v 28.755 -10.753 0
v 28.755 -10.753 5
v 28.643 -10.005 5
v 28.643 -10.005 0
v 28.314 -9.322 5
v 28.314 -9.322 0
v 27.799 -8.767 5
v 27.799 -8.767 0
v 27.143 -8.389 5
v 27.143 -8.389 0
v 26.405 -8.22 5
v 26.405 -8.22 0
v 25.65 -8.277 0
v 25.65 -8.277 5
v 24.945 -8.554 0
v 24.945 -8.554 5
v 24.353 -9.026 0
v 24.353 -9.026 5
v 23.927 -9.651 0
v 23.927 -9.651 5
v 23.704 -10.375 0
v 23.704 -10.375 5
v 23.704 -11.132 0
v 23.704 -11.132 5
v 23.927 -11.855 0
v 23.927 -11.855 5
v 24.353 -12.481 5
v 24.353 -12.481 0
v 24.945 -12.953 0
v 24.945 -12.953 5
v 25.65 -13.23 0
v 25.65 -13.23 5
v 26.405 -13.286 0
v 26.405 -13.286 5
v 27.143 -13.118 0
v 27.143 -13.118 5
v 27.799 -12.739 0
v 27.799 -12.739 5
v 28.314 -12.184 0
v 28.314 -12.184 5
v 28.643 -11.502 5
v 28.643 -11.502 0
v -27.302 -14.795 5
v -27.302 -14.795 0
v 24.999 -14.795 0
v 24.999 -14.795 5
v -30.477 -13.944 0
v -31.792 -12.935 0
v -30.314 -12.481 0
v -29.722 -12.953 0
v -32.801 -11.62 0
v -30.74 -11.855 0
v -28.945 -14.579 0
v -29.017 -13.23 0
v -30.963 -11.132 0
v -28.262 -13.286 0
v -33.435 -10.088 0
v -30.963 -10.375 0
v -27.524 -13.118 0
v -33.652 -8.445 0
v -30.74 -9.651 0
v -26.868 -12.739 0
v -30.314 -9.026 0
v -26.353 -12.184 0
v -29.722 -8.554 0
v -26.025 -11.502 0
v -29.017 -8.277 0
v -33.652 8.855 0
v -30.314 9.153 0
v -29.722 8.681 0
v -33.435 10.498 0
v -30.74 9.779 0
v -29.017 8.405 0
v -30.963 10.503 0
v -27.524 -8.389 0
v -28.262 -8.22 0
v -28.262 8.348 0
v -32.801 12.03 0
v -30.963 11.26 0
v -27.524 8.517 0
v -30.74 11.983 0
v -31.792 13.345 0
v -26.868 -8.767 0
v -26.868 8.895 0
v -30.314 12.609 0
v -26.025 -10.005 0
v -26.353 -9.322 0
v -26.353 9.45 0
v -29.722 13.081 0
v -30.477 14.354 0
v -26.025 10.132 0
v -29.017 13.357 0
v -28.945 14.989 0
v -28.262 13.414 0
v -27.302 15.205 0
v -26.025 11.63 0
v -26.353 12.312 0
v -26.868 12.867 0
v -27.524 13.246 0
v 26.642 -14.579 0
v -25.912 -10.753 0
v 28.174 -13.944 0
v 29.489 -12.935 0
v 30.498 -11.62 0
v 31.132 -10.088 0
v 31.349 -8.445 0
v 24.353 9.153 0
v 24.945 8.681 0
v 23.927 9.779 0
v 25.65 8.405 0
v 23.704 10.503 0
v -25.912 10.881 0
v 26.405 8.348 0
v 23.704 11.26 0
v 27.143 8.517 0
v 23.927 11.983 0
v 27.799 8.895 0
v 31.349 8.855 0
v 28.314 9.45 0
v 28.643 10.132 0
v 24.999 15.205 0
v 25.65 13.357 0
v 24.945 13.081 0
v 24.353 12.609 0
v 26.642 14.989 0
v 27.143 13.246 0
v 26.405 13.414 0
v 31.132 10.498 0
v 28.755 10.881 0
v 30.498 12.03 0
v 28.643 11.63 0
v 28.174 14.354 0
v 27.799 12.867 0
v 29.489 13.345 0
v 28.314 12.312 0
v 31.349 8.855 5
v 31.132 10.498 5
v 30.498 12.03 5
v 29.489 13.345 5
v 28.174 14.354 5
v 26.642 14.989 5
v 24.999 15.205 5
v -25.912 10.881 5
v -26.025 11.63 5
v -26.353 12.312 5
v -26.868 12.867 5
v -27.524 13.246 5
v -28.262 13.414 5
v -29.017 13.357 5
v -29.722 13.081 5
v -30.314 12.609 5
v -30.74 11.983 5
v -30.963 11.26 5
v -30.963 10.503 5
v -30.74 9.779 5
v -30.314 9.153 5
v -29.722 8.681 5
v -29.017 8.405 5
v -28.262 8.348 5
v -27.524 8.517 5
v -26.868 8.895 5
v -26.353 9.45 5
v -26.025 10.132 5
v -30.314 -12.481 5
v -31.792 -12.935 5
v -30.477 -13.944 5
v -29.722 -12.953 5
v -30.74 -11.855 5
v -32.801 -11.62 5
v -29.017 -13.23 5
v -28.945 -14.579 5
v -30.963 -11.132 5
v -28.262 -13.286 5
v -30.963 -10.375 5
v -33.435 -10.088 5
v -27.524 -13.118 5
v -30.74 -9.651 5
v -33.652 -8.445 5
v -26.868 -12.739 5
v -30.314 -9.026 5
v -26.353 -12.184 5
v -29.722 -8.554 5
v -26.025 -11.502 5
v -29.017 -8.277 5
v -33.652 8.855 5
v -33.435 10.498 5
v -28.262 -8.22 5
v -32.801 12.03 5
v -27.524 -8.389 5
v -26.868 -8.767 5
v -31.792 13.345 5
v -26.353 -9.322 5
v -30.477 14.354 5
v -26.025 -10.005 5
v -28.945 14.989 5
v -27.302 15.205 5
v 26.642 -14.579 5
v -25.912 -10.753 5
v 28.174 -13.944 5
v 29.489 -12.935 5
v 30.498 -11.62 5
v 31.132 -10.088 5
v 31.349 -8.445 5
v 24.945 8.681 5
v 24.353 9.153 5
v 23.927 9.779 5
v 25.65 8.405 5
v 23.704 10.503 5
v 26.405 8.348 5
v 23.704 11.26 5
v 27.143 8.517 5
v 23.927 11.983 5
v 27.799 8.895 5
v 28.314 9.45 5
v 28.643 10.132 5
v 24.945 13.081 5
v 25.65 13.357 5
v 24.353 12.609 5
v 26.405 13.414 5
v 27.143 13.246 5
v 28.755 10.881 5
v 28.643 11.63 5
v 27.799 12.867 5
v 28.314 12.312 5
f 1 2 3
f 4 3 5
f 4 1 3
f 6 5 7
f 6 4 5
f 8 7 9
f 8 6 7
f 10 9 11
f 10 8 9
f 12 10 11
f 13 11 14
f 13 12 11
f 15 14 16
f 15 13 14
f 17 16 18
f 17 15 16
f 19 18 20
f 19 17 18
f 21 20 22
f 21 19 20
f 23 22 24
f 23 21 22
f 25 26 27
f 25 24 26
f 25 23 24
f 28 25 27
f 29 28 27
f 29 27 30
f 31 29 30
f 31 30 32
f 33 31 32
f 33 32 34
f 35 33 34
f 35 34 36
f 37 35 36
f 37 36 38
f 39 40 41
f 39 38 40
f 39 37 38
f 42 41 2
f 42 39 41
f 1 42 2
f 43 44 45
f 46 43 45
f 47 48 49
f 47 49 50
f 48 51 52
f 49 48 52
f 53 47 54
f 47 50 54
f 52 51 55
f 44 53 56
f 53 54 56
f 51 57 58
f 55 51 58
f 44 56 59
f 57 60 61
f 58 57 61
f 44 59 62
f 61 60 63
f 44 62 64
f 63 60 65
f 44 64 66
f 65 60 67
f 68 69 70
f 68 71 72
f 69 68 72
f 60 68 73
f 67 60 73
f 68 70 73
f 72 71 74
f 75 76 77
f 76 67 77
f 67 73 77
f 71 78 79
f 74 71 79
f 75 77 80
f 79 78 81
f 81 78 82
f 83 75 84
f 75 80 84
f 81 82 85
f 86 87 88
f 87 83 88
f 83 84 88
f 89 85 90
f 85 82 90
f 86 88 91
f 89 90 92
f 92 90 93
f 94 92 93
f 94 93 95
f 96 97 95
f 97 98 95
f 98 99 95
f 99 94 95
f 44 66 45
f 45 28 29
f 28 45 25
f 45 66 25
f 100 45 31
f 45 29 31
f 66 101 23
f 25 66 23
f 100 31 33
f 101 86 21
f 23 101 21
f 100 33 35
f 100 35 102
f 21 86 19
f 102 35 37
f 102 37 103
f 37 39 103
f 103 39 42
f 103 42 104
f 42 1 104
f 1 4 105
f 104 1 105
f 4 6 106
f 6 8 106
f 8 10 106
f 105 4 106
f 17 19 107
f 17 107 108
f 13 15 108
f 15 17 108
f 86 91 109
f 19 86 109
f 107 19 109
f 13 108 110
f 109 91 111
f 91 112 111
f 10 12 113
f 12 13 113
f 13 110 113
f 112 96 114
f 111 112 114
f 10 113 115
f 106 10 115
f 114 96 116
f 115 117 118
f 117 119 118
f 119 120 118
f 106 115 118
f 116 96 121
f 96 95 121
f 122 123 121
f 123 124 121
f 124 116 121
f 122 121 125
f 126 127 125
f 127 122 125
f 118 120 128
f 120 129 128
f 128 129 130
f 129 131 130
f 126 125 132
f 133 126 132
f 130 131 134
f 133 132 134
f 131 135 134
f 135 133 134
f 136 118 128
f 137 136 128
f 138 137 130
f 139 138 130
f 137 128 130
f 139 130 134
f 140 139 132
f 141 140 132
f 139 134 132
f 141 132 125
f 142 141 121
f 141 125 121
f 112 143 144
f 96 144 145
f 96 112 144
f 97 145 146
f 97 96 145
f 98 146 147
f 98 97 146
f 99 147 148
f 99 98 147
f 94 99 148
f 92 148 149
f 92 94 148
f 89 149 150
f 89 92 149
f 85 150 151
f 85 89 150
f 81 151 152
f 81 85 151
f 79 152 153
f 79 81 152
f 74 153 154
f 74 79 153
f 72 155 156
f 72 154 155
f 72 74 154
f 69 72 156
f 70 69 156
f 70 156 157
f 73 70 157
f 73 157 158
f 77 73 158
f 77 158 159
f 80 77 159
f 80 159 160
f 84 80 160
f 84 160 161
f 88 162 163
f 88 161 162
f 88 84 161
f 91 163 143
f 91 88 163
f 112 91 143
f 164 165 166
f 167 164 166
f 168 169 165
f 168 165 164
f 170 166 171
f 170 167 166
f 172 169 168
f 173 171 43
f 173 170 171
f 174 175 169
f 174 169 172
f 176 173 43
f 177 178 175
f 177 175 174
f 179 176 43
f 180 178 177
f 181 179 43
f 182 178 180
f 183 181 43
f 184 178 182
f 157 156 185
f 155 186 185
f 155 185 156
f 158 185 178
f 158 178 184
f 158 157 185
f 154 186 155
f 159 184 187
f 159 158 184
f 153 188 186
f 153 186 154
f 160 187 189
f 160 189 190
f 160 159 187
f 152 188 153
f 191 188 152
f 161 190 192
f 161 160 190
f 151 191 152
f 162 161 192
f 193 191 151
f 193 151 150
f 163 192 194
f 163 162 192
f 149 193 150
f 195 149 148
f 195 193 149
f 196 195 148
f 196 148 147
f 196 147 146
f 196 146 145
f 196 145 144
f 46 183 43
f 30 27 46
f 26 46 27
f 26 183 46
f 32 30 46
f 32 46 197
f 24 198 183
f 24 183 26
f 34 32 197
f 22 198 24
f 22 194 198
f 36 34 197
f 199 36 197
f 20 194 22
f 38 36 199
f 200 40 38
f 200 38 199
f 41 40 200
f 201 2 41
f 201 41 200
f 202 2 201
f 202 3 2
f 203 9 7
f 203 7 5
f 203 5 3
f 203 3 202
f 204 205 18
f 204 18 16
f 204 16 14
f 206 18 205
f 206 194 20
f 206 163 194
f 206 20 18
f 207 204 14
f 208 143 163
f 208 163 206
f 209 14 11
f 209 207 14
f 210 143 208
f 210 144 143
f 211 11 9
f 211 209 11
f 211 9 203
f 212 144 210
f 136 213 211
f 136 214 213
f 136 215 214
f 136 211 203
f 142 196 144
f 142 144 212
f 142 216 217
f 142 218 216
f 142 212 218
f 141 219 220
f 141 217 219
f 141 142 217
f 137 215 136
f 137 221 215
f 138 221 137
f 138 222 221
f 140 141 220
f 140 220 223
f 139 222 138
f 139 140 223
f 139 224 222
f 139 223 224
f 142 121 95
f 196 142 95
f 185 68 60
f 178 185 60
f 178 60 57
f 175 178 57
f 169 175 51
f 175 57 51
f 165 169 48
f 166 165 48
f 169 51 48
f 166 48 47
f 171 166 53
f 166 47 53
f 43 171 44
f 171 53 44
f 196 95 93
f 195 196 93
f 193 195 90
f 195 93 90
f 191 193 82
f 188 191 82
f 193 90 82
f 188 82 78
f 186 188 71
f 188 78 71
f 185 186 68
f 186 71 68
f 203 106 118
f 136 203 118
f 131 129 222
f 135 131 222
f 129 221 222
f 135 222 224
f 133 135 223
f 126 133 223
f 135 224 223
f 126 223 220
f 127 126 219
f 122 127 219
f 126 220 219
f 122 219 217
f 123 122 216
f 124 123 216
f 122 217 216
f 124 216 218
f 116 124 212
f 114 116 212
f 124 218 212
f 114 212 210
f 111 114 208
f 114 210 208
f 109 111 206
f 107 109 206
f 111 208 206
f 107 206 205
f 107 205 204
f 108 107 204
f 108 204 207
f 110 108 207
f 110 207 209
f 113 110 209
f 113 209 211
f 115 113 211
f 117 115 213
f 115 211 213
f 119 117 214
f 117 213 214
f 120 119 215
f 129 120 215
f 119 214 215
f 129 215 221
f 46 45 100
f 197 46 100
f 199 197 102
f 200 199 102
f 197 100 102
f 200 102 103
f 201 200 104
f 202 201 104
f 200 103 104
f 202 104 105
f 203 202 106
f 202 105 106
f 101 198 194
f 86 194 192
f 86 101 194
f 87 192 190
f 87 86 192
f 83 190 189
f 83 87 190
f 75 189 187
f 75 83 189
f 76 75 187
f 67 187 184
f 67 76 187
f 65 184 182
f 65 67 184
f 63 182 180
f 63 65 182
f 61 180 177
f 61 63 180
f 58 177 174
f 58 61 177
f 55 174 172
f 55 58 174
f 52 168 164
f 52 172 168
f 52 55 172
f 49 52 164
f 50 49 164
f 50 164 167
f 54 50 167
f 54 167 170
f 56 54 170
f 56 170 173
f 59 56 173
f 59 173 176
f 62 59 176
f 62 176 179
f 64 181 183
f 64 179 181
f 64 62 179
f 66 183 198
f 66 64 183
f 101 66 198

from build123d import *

# Parameters (mm, degrees)
F1_DEPTH = 4.99999
F2_R     = 2.54
F3_DEPTH = 12.7


# Not quite as in the source:
# - the program builds the solid bodies; features that only make, move or delete a surface that nothing else refers to are left out


with BuildPart() as f1:
    # F0 (on Top) → F1 (new body)
    with BuildSketch(Plane.XY):
        with BuildLine():
            Line((24.9985645242, 15.2049488522), (-27.3015594758, 15.2049488522))
            ThreePointArc((-27.3015594758, 15.2049488522), (-31.7916875363, 13.3450769127), (-33.6515594758, 8.8549488522))
            Line((-33.6515594758, 8.8549488522), (-33.6515594758, -8.4449911478))
            ThreePointArc((-33.6515594758, -8.4449911478), (-31.7916875363, -12.9351192083), (-27.3015594758, -14.7949911478))
            Line((-27.3015594758, -14.7949911478), (24.9985645242, -14.7949911478))
            ThreePointArc((24.9985645242, -14.7949911478), (29.4886925847, -12.9351192083), (31.3485645242, -8.4449911478))
            Line((31.3485645242, -8.4449911478), (31.3485645242, 8.8549488522))
            ThreePointArc((31.3485645242, 8.8549488522), (29.4886925847, 13.3450769127), (24.9985645242, 15.2049488522))
        make_face()
    extrude(amount=F1_DEPTH)

    # F2 (on Top) → F3 (cut, symmetric)
    with BuildSketch(Plane.XY):
        with Locations((-28.451833874, 10.8810858801)):
            Circle(F2_R)
        with Locations((-28.451833874, -10.7532069087)):
            Circle(F2_R)
        with Locations((26.2153949589, -10.7532069087)):
            Circle(F2_R)
        with Locations((26.2153949589, 10.8810858801)):
            Circle(F2_R)
    extrude(amount=F3_DEPTH, both=True, mode=Mode.SUBTRACT)


solid = f1.part
